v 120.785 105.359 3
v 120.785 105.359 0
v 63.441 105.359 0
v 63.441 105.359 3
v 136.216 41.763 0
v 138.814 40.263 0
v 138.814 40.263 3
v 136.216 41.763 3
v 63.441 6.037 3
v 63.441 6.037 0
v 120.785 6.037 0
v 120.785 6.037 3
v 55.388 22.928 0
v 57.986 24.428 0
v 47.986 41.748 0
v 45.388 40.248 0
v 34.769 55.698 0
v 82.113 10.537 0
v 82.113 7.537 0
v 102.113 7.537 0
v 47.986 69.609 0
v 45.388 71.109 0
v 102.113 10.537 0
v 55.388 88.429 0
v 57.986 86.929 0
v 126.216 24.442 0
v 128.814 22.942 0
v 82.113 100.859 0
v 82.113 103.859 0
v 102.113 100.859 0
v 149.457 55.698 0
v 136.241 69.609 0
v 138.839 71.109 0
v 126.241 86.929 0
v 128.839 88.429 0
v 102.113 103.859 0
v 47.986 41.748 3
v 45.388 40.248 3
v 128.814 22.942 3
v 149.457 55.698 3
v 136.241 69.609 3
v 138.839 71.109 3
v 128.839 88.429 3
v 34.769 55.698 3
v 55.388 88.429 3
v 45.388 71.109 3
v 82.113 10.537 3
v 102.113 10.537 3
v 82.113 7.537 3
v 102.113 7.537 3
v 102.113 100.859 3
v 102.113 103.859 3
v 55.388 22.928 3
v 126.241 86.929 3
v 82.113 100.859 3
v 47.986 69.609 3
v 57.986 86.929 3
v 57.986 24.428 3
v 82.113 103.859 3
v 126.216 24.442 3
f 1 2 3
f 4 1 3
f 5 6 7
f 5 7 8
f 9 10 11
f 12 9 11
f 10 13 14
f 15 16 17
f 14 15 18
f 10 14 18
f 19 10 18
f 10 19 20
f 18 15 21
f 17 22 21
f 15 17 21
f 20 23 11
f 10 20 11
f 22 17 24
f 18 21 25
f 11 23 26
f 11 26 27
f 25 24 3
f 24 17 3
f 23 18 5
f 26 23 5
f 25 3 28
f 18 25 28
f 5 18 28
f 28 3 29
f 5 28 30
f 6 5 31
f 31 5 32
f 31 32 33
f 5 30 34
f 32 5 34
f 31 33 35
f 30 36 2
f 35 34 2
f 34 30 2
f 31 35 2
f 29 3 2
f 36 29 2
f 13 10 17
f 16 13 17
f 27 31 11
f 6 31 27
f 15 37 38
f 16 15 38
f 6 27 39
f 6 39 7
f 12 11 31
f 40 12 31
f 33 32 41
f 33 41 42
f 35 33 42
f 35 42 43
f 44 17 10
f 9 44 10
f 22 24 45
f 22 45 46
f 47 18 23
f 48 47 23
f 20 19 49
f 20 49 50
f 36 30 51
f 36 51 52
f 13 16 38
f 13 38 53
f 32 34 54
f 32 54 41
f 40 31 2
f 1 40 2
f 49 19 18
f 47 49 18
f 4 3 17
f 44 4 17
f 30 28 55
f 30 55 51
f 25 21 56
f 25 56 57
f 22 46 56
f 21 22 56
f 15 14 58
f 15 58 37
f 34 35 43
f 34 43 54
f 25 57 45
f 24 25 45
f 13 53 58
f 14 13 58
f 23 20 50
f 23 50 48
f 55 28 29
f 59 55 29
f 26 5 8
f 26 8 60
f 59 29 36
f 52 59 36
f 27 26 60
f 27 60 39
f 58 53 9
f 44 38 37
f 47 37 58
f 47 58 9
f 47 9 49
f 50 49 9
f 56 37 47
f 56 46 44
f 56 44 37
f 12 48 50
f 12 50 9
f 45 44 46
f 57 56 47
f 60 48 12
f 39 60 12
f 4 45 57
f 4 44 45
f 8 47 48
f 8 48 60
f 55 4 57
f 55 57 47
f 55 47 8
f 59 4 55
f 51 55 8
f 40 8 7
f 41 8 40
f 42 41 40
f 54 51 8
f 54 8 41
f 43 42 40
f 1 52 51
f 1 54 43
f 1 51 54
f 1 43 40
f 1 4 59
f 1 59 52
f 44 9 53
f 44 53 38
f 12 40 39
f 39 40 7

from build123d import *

# Parameters (mm, degrees)
MODEL_W             = 20
MODEL_H             = 3
BOSS_EXTRUDE1_DEPTH = 3


with BuildPart() as part:
    # Model → Boss-Extrude1 (new body)
    with BuildSketch(Plane.XY):
        Polygon((149.457182746, 55.697979038), (120.785258916, 105.359207863), (63.441411255, 105.359207863), (34.769487424, 55.697979038), (63.441411255, 6.036750213), (120.785258916, 6.036750213), align=None)
        with Locations((92.113335085, 102.359207863)):
            Rectangle(MODEL_W, MODEL_H, mode=Mode.SUBTRACT)
        with Locations((92.113335085, 9.036750213)):
            Rectangle(MODEL_W, MODEL_H, mode=Mode.SUBTRACT)
        Polygon((126.215627262, 24.442424093), (128.813703474, 22.942424093), (138.813703474, 40.262932169), (136.215627262, 41.762932169), align=None, mode=Mode.SUBTRACT)
        Polygon((128.839141228, 88.429056492), (126.241065016, 86.929056492), (136.241065016, 69.608548416), (138.839141228, 71.108548416), align=None, mode=Mode.SUBTRACT)
        Polygon((55.387528943, 22.927737599), (57.985605154, 24.427737599), (47.985605154, 41.748245675), (45.387528943, 40.248245675), align=None, mode=Mode.SUBTRACT)
        Polygon((45.387528943, 71.108548416), (47.985605154, 69.608548416), (57.985605154, 86.929056492), (55.387528943, 88.429056492), align=None, mode=Mode.SUBTRACT)
    extrude(amount=BOSS_EXTRUDE1_DEPTH)


solid = part.part
